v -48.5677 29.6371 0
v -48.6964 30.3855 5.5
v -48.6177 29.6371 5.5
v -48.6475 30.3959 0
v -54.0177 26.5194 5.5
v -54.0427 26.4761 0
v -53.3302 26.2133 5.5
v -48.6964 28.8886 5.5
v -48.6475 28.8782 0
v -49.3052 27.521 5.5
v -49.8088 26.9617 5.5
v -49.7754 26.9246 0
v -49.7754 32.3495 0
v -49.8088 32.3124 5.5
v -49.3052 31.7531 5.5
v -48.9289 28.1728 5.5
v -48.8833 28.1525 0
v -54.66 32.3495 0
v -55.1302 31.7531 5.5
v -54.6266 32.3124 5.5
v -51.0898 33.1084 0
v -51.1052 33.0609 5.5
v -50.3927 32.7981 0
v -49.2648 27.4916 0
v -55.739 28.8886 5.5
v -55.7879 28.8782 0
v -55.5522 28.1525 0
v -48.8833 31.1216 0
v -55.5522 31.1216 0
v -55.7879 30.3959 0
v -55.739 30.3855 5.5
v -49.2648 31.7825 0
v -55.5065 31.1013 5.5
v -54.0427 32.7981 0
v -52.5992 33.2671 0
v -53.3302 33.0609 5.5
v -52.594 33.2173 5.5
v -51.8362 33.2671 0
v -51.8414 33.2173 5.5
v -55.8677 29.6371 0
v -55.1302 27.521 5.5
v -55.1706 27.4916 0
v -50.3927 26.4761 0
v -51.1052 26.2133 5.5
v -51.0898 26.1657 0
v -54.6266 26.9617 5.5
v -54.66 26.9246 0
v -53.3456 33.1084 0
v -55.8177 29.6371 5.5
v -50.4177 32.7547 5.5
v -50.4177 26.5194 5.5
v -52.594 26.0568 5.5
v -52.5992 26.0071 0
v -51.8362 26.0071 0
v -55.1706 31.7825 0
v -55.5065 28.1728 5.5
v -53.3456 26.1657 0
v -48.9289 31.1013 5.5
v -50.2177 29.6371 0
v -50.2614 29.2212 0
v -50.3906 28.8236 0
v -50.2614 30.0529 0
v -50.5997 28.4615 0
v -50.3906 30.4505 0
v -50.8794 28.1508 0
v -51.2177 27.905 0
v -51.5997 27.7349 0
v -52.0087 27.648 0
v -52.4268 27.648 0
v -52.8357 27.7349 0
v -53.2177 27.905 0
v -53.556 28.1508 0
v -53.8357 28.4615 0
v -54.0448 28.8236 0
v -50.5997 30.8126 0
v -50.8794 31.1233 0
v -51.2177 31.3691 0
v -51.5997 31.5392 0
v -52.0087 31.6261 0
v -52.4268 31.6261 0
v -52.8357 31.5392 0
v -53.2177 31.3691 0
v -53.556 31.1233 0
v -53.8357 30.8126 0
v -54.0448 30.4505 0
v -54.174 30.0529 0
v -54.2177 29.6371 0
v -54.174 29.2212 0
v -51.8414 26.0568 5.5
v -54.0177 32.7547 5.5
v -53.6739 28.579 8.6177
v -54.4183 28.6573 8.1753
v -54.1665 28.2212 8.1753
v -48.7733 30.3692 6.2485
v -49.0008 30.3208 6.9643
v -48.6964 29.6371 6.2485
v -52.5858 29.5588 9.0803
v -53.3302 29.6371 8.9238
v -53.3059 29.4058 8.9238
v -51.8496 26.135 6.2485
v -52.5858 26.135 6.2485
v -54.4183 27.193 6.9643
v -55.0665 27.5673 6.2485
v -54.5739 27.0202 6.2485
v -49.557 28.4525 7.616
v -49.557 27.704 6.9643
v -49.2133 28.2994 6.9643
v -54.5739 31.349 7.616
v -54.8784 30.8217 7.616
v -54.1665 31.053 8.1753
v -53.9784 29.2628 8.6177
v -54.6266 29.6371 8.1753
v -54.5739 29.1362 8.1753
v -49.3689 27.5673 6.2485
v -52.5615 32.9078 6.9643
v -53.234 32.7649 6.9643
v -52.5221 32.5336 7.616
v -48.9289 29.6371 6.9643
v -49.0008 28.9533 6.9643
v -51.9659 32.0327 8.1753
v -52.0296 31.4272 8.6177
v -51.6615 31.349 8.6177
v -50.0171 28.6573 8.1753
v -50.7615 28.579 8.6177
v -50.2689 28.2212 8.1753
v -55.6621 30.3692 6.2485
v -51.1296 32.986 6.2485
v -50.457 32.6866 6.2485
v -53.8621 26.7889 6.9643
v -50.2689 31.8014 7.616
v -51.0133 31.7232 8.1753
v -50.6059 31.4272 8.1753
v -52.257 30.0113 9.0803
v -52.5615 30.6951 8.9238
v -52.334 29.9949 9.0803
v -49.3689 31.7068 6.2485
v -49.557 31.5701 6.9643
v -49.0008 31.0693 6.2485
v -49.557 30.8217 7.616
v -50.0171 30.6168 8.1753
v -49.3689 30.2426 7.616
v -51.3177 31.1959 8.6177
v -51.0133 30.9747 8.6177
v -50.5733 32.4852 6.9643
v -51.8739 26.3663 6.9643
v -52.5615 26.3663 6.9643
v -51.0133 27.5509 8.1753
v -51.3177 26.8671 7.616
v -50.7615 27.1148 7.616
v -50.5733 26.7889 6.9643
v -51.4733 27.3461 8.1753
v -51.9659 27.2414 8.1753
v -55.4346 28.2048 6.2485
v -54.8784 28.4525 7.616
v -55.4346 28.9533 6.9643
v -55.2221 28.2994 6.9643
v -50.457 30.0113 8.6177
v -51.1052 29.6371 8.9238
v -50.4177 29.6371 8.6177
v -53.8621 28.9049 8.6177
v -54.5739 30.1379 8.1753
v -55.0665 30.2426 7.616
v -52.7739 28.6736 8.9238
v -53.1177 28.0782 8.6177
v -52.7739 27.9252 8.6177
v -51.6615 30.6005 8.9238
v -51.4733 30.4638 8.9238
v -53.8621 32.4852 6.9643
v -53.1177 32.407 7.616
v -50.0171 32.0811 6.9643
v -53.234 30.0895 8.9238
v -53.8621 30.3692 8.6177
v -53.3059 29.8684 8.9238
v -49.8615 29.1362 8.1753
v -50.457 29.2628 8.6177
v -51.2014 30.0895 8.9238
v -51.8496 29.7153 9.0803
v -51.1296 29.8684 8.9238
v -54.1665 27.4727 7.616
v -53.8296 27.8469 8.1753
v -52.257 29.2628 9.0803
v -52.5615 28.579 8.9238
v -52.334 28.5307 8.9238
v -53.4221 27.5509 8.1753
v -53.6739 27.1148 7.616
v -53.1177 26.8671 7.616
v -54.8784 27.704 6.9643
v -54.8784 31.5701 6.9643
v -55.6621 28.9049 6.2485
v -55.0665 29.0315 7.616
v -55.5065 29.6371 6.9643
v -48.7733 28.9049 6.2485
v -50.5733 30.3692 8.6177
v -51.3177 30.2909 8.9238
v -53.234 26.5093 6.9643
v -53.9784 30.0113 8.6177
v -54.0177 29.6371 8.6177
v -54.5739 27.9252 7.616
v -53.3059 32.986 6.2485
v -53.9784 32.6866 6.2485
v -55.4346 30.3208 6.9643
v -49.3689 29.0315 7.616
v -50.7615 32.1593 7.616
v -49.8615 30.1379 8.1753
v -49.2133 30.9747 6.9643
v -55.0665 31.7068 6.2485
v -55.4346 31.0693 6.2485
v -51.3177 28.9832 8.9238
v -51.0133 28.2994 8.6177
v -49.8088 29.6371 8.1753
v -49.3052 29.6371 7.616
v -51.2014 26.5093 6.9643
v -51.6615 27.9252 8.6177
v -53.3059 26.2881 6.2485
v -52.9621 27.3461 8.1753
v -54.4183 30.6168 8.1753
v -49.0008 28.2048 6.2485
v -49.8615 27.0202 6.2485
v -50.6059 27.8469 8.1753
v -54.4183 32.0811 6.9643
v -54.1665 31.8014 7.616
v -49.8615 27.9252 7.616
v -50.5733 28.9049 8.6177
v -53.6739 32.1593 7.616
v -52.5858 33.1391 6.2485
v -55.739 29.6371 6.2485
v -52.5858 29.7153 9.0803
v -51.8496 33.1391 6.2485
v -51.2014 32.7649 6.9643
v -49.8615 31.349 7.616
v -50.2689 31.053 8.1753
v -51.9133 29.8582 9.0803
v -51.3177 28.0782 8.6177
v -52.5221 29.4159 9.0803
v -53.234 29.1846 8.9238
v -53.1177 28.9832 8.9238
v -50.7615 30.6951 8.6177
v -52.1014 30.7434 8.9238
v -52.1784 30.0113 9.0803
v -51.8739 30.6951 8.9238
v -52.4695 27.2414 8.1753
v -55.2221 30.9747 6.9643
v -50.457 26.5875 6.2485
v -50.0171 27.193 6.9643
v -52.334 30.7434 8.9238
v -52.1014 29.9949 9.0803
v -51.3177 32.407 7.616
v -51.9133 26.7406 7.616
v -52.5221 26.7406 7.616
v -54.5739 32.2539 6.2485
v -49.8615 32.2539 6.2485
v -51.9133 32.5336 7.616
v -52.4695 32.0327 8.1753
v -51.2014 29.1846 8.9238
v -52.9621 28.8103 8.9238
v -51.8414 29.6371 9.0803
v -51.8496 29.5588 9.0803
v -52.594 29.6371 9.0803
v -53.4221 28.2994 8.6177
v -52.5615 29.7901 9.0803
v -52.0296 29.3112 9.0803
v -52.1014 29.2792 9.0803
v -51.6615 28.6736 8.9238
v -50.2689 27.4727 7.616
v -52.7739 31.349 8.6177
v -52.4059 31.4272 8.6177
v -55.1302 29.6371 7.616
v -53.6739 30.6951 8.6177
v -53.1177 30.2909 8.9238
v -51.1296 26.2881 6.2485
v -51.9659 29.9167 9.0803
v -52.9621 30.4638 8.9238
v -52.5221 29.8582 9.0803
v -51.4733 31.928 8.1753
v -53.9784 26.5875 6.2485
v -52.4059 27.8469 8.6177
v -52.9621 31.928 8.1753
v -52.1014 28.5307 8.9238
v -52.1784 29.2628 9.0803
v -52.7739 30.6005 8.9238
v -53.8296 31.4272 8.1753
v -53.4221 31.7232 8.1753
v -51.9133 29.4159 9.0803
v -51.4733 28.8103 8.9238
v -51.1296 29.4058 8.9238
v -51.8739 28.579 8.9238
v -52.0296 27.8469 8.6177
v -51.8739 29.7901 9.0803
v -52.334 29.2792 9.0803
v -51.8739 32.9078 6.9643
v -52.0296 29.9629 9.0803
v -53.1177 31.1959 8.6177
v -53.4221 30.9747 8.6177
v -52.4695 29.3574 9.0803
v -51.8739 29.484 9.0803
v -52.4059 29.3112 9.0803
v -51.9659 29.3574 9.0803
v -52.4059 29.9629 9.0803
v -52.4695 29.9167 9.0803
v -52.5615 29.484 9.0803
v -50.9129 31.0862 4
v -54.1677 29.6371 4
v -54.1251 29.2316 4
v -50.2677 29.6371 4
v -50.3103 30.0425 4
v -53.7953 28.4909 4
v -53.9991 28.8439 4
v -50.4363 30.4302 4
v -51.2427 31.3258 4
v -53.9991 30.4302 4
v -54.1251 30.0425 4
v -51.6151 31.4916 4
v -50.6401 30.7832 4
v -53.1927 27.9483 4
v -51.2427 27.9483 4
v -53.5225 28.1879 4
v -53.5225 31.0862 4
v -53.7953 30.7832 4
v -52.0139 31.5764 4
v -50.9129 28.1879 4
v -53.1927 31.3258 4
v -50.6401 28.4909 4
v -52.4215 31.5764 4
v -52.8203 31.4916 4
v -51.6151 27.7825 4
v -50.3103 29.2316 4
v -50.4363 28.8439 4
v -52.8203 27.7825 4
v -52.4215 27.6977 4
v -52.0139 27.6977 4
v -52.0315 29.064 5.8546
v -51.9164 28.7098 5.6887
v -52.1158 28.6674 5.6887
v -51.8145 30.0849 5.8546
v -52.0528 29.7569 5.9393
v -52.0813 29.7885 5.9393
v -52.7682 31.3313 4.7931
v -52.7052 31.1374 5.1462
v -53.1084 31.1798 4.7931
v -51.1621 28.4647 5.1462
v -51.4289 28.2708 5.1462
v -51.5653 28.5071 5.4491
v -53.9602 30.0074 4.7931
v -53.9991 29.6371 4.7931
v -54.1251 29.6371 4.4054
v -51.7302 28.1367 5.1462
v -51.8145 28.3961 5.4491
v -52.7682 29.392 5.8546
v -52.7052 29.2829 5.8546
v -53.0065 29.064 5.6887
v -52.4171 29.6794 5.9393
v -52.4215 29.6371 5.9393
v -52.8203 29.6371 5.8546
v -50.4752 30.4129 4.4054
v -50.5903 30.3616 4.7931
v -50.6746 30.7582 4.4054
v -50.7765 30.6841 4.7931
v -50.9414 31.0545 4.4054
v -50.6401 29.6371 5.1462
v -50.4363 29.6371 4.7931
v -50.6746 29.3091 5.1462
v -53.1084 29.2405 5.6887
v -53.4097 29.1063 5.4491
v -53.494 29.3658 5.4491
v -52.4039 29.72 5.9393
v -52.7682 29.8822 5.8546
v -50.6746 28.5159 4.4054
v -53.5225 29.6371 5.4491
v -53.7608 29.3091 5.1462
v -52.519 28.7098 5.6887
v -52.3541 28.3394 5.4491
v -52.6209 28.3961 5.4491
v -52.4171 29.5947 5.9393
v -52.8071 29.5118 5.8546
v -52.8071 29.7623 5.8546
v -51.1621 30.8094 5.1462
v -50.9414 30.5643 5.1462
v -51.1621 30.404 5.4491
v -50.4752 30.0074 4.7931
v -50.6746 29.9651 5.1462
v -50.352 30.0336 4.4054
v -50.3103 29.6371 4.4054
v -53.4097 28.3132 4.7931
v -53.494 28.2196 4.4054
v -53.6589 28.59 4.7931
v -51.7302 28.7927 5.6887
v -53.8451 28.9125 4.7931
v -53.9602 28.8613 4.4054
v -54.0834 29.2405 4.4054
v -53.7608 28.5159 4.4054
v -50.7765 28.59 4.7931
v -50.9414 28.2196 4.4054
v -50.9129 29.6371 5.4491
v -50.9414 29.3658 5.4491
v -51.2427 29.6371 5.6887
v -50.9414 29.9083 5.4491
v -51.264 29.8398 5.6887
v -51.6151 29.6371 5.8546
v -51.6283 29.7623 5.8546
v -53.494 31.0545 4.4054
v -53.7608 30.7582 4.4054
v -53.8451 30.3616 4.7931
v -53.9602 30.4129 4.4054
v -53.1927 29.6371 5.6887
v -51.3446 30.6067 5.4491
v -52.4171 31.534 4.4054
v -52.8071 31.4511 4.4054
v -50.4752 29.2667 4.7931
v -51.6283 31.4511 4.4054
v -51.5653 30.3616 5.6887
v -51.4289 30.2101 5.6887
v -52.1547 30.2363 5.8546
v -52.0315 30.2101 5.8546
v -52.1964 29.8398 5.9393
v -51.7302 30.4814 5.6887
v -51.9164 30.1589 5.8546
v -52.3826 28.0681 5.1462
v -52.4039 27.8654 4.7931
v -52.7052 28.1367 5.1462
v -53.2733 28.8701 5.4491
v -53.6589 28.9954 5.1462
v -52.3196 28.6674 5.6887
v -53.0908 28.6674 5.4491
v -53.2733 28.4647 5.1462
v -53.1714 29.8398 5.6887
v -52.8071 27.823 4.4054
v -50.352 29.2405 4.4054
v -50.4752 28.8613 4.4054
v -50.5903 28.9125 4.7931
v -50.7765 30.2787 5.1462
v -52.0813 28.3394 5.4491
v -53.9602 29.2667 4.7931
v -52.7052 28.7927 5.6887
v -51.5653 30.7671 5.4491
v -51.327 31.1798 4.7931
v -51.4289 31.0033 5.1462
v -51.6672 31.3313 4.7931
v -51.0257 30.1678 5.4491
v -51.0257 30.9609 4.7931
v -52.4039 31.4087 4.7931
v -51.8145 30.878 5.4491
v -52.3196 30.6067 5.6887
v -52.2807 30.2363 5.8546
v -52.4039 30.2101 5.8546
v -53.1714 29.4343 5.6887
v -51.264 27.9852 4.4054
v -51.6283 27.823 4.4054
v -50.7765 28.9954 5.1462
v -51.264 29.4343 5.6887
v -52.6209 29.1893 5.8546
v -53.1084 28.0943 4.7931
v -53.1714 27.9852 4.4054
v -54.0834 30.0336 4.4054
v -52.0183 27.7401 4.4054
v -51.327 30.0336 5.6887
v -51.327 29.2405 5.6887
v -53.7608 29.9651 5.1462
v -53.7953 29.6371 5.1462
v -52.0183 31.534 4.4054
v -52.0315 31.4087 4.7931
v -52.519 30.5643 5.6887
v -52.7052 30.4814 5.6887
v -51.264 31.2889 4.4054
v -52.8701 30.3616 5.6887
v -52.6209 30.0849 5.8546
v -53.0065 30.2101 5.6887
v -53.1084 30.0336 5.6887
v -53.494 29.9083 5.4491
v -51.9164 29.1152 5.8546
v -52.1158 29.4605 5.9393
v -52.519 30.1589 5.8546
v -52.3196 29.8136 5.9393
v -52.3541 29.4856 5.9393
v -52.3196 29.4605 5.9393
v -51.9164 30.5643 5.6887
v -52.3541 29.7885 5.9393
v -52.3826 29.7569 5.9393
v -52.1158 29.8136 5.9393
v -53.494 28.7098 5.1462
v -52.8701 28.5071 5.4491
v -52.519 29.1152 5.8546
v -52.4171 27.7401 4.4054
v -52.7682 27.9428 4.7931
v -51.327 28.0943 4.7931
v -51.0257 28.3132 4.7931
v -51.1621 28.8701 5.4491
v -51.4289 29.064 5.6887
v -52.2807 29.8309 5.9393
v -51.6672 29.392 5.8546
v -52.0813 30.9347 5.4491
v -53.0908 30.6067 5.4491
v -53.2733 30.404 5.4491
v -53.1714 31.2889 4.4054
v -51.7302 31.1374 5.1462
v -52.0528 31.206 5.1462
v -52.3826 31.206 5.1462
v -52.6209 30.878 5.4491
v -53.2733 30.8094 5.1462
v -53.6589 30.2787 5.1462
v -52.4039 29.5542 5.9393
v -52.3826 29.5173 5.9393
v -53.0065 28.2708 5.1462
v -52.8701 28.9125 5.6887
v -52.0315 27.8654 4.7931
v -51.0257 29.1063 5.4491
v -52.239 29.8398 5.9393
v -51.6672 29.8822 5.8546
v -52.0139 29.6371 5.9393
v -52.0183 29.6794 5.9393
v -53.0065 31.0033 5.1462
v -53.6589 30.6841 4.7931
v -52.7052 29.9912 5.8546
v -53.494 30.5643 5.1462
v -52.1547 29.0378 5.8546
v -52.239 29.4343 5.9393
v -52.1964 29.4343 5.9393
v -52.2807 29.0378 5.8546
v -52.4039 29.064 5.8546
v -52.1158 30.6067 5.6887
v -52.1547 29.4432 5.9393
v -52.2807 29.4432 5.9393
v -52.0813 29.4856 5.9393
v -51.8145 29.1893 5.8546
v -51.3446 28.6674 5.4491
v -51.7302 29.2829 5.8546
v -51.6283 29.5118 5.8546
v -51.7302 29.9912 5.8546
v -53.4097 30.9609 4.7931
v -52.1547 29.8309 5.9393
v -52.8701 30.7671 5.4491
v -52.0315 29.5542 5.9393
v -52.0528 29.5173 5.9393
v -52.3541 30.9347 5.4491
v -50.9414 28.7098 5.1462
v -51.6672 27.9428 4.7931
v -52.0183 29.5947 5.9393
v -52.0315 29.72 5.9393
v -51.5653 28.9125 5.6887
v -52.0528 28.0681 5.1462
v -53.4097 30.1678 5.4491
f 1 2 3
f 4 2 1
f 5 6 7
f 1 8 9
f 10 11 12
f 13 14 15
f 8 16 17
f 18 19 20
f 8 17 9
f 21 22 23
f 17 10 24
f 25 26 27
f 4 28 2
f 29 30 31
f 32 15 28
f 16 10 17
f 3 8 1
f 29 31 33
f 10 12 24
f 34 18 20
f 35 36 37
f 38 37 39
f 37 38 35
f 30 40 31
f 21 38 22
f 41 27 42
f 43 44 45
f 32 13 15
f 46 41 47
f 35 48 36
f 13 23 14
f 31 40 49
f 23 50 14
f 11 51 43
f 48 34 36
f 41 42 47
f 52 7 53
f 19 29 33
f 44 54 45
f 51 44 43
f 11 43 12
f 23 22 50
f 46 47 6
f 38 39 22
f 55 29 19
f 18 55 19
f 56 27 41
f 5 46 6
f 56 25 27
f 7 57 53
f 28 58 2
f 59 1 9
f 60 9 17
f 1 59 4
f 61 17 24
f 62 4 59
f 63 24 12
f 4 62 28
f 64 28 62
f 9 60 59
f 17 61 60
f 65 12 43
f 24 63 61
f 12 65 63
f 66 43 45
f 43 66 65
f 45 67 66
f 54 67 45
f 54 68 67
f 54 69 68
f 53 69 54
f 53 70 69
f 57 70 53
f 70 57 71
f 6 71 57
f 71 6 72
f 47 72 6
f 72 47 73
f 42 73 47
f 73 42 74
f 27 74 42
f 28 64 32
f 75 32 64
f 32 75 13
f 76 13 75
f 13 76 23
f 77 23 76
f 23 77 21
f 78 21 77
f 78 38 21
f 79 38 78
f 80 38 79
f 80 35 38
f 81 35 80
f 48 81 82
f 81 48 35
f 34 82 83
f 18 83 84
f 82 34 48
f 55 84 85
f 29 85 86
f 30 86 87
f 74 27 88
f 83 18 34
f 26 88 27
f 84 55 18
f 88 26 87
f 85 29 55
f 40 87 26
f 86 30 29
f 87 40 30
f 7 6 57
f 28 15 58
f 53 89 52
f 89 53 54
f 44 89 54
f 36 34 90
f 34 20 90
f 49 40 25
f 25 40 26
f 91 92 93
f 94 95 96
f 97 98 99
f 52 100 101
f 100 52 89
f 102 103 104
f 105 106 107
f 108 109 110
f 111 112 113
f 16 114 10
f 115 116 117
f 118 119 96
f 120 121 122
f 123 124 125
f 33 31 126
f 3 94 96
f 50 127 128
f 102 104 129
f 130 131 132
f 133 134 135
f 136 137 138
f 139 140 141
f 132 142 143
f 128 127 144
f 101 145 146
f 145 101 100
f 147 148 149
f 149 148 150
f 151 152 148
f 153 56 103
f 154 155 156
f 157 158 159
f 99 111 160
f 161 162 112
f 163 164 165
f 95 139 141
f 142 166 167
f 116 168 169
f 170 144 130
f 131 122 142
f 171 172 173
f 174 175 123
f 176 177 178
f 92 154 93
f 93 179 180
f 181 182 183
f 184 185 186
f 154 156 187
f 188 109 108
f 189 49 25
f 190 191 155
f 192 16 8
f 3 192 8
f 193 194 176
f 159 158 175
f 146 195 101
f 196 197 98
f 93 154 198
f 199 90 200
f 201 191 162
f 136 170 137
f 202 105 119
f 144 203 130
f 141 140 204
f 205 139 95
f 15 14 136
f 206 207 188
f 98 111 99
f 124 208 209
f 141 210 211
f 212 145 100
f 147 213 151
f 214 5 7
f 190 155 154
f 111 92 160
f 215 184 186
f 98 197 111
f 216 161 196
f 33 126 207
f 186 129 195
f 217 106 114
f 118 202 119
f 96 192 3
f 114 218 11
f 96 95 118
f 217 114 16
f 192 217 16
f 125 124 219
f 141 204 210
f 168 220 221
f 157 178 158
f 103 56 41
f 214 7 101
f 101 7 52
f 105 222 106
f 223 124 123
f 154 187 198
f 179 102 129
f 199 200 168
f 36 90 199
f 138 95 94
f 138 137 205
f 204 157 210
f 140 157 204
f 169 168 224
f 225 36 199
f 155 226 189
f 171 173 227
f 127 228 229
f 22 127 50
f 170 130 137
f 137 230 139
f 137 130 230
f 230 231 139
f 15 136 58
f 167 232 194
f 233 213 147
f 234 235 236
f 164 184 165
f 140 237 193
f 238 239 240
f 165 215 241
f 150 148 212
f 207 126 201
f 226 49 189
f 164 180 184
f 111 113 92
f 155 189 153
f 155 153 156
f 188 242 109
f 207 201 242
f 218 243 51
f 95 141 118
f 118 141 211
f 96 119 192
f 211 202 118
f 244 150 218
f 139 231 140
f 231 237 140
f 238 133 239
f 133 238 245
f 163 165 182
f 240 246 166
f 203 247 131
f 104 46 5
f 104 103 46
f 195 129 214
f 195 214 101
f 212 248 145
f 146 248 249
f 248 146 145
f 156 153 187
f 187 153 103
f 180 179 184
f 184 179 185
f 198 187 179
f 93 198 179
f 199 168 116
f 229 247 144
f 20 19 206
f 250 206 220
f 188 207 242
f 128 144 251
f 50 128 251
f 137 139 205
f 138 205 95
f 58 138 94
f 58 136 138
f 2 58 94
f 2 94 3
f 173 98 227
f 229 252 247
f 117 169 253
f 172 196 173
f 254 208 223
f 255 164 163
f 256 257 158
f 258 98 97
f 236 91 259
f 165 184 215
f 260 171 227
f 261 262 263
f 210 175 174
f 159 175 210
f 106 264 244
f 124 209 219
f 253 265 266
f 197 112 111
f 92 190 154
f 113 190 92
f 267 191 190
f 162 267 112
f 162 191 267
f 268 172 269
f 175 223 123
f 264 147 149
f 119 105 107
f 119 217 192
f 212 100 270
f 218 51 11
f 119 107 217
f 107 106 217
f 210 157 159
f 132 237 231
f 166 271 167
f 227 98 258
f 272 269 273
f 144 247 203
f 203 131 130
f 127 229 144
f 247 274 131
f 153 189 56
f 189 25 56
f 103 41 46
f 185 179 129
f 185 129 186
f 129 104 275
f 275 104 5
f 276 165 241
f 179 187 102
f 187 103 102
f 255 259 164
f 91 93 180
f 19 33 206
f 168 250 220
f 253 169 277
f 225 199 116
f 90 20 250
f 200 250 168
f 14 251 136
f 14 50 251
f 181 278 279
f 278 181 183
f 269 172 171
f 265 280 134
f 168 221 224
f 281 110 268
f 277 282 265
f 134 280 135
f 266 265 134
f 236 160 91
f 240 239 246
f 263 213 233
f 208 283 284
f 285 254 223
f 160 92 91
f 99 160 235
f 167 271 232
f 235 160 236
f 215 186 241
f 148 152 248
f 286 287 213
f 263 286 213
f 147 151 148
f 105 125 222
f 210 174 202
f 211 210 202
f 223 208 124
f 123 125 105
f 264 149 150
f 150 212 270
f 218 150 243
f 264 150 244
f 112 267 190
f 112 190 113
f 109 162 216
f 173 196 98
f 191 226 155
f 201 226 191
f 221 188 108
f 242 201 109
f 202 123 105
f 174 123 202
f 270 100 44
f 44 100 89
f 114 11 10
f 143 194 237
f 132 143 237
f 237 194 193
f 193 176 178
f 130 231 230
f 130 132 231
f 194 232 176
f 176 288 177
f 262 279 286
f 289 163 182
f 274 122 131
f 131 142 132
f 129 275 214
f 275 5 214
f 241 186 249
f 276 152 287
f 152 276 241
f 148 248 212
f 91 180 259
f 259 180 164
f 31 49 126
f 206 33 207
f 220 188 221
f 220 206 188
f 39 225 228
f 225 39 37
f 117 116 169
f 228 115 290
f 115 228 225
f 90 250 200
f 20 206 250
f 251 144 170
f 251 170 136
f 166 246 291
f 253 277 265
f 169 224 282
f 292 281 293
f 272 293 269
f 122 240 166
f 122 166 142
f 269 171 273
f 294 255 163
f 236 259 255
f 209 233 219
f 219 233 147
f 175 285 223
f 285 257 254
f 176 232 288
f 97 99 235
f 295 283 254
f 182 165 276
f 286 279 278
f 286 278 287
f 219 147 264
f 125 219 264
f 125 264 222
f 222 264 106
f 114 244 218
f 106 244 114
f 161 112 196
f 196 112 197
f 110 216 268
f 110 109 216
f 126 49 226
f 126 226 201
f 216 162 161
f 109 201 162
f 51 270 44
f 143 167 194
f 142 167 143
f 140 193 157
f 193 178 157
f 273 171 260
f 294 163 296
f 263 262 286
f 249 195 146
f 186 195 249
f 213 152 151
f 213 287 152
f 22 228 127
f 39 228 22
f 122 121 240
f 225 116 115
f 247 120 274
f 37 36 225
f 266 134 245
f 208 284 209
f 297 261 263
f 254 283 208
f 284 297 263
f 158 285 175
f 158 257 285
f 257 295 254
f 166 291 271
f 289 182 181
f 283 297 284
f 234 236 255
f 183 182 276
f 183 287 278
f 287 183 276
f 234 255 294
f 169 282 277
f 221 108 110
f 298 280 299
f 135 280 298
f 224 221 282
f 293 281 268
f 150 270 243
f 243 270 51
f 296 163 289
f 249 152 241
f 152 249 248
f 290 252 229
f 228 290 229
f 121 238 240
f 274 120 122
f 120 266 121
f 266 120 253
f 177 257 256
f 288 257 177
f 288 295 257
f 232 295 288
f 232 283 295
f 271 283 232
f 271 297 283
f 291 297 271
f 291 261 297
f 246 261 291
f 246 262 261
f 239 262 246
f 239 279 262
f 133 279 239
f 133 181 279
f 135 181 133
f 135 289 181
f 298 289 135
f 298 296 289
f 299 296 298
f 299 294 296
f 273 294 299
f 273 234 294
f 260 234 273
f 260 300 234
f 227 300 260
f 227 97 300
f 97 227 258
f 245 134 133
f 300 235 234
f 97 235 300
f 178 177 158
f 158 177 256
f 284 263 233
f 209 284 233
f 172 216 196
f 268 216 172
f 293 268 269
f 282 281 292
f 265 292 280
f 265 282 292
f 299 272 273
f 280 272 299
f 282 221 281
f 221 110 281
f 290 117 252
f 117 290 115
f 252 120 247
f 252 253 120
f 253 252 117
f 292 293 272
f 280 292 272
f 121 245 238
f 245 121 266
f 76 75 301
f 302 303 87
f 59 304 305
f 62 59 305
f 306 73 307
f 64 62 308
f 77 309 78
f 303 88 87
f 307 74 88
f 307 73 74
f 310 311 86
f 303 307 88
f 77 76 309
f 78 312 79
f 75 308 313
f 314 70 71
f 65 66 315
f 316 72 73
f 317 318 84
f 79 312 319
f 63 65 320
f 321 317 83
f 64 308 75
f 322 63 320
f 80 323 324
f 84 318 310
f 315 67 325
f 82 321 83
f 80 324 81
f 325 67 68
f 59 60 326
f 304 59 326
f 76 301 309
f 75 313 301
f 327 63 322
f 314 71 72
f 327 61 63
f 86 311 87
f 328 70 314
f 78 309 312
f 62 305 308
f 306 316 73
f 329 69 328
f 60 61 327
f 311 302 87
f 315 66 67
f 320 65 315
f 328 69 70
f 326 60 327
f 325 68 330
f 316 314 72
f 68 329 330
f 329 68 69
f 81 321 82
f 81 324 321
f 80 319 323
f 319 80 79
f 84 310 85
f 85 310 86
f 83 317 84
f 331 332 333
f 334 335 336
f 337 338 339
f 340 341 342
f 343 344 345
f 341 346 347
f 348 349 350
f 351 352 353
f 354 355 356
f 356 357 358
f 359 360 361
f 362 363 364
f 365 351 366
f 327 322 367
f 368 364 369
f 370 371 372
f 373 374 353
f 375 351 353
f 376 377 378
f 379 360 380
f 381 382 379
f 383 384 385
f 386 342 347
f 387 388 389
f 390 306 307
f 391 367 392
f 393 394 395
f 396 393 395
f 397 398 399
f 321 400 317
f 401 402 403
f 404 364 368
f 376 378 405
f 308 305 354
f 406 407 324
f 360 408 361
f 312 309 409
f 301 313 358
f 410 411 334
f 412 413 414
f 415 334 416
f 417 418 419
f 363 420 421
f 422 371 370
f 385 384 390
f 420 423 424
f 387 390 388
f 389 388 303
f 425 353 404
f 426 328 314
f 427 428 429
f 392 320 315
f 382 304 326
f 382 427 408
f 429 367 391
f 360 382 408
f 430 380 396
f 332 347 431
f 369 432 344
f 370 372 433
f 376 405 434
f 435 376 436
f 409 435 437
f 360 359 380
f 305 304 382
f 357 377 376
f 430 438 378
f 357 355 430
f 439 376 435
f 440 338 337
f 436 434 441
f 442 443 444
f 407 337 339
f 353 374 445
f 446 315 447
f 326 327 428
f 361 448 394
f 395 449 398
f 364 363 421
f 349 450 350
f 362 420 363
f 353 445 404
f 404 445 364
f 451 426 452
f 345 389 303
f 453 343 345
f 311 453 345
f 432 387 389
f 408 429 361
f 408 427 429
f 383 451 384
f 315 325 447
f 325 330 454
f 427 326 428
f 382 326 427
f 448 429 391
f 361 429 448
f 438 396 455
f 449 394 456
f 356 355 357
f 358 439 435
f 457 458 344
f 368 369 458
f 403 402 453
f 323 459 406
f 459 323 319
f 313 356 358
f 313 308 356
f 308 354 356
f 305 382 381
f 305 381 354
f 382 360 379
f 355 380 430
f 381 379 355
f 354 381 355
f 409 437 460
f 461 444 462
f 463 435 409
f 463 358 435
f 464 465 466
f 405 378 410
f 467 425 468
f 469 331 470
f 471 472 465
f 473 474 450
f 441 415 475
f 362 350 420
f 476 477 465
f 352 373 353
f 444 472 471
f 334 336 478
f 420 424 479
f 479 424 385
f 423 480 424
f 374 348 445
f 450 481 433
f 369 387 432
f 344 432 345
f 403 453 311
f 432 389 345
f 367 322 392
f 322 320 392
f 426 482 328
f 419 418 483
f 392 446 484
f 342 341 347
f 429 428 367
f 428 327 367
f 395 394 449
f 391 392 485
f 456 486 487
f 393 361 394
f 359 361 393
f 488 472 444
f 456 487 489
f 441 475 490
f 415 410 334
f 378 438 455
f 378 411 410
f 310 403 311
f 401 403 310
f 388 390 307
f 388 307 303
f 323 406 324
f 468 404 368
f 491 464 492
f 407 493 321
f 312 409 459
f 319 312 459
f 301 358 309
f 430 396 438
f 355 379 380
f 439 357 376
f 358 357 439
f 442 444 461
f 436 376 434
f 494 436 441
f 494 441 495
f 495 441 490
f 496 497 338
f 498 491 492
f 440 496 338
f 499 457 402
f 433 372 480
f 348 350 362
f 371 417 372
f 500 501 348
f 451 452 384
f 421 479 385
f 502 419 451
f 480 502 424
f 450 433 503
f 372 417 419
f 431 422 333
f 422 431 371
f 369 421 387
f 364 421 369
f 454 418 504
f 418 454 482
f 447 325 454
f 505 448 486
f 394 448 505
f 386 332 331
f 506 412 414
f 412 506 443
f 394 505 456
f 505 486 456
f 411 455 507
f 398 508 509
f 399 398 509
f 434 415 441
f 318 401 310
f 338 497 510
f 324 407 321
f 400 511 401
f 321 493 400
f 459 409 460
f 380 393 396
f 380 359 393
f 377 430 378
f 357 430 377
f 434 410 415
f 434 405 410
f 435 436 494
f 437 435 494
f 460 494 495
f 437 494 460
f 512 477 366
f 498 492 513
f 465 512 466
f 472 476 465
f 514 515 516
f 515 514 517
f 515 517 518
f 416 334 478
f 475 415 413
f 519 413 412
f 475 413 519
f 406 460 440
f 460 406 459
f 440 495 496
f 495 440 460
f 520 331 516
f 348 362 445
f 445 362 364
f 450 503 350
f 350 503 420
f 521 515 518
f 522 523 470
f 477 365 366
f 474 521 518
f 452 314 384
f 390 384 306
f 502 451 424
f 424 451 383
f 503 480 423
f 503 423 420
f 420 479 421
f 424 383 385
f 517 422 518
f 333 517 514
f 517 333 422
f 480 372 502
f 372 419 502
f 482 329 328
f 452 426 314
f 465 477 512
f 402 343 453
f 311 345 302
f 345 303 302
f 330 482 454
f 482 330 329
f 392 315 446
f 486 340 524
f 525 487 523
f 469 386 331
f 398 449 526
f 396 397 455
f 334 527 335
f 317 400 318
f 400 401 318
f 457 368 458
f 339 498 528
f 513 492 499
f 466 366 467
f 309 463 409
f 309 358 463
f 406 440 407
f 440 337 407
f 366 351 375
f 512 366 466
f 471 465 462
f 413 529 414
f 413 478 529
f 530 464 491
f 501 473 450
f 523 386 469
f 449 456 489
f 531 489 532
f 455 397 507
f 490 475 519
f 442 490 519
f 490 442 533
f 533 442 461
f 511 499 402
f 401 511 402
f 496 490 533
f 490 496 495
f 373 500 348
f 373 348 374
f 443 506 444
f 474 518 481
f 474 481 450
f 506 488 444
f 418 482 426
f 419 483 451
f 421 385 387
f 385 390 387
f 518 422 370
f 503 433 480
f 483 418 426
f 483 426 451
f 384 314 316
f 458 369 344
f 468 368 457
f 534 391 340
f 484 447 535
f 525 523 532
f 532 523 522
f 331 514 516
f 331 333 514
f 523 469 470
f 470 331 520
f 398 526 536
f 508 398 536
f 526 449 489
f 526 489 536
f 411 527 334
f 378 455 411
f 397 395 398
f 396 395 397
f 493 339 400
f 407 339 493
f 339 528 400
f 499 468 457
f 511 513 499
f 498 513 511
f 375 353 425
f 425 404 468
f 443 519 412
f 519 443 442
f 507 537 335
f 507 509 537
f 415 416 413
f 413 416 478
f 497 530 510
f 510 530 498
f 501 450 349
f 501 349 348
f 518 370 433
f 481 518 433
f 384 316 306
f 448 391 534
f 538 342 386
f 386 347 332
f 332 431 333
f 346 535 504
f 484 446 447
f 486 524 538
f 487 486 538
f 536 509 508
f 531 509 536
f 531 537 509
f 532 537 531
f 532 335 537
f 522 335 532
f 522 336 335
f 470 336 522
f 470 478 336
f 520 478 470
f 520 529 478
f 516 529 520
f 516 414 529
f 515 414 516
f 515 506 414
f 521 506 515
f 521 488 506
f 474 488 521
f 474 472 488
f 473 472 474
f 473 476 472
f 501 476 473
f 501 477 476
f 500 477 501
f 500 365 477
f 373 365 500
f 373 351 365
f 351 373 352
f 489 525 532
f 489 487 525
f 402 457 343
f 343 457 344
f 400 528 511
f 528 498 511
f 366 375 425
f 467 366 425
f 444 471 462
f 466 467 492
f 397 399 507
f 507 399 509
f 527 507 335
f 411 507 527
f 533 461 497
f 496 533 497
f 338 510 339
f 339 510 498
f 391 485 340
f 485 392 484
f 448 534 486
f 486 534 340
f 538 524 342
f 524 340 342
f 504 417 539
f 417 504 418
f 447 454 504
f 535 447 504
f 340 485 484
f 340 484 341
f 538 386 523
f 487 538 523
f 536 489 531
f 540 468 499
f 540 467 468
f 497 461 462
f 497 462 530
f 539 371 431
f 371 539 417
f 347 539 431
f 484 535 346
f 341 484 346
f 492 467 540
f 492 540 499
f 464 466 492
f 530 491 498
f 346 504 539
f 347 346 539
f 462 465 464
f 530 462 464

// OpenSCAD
difference () {
  translate ([-52.21770936355016, 29.63706015011317, 2.75]) {
    union () {
      cylinder ($fn=30, h=5.5, r1=3.65, r2=3.5999999999999996, center=true);
      translate ([0, 0, 2.75]) {
        sphere ($fn=30, r=3.5999999999999996);
      }
    }
  }
  translate ([-52.21770936355016, 29.63706015011317, 2]) {
    union () {
      cylinder ($fn=30, h=4, r1=2.0, r2=1.95, center=true);
      translate ([0, 0, 2]) {
        sphere ($fn=30, r=1.95);
      }
    }
  }
}
